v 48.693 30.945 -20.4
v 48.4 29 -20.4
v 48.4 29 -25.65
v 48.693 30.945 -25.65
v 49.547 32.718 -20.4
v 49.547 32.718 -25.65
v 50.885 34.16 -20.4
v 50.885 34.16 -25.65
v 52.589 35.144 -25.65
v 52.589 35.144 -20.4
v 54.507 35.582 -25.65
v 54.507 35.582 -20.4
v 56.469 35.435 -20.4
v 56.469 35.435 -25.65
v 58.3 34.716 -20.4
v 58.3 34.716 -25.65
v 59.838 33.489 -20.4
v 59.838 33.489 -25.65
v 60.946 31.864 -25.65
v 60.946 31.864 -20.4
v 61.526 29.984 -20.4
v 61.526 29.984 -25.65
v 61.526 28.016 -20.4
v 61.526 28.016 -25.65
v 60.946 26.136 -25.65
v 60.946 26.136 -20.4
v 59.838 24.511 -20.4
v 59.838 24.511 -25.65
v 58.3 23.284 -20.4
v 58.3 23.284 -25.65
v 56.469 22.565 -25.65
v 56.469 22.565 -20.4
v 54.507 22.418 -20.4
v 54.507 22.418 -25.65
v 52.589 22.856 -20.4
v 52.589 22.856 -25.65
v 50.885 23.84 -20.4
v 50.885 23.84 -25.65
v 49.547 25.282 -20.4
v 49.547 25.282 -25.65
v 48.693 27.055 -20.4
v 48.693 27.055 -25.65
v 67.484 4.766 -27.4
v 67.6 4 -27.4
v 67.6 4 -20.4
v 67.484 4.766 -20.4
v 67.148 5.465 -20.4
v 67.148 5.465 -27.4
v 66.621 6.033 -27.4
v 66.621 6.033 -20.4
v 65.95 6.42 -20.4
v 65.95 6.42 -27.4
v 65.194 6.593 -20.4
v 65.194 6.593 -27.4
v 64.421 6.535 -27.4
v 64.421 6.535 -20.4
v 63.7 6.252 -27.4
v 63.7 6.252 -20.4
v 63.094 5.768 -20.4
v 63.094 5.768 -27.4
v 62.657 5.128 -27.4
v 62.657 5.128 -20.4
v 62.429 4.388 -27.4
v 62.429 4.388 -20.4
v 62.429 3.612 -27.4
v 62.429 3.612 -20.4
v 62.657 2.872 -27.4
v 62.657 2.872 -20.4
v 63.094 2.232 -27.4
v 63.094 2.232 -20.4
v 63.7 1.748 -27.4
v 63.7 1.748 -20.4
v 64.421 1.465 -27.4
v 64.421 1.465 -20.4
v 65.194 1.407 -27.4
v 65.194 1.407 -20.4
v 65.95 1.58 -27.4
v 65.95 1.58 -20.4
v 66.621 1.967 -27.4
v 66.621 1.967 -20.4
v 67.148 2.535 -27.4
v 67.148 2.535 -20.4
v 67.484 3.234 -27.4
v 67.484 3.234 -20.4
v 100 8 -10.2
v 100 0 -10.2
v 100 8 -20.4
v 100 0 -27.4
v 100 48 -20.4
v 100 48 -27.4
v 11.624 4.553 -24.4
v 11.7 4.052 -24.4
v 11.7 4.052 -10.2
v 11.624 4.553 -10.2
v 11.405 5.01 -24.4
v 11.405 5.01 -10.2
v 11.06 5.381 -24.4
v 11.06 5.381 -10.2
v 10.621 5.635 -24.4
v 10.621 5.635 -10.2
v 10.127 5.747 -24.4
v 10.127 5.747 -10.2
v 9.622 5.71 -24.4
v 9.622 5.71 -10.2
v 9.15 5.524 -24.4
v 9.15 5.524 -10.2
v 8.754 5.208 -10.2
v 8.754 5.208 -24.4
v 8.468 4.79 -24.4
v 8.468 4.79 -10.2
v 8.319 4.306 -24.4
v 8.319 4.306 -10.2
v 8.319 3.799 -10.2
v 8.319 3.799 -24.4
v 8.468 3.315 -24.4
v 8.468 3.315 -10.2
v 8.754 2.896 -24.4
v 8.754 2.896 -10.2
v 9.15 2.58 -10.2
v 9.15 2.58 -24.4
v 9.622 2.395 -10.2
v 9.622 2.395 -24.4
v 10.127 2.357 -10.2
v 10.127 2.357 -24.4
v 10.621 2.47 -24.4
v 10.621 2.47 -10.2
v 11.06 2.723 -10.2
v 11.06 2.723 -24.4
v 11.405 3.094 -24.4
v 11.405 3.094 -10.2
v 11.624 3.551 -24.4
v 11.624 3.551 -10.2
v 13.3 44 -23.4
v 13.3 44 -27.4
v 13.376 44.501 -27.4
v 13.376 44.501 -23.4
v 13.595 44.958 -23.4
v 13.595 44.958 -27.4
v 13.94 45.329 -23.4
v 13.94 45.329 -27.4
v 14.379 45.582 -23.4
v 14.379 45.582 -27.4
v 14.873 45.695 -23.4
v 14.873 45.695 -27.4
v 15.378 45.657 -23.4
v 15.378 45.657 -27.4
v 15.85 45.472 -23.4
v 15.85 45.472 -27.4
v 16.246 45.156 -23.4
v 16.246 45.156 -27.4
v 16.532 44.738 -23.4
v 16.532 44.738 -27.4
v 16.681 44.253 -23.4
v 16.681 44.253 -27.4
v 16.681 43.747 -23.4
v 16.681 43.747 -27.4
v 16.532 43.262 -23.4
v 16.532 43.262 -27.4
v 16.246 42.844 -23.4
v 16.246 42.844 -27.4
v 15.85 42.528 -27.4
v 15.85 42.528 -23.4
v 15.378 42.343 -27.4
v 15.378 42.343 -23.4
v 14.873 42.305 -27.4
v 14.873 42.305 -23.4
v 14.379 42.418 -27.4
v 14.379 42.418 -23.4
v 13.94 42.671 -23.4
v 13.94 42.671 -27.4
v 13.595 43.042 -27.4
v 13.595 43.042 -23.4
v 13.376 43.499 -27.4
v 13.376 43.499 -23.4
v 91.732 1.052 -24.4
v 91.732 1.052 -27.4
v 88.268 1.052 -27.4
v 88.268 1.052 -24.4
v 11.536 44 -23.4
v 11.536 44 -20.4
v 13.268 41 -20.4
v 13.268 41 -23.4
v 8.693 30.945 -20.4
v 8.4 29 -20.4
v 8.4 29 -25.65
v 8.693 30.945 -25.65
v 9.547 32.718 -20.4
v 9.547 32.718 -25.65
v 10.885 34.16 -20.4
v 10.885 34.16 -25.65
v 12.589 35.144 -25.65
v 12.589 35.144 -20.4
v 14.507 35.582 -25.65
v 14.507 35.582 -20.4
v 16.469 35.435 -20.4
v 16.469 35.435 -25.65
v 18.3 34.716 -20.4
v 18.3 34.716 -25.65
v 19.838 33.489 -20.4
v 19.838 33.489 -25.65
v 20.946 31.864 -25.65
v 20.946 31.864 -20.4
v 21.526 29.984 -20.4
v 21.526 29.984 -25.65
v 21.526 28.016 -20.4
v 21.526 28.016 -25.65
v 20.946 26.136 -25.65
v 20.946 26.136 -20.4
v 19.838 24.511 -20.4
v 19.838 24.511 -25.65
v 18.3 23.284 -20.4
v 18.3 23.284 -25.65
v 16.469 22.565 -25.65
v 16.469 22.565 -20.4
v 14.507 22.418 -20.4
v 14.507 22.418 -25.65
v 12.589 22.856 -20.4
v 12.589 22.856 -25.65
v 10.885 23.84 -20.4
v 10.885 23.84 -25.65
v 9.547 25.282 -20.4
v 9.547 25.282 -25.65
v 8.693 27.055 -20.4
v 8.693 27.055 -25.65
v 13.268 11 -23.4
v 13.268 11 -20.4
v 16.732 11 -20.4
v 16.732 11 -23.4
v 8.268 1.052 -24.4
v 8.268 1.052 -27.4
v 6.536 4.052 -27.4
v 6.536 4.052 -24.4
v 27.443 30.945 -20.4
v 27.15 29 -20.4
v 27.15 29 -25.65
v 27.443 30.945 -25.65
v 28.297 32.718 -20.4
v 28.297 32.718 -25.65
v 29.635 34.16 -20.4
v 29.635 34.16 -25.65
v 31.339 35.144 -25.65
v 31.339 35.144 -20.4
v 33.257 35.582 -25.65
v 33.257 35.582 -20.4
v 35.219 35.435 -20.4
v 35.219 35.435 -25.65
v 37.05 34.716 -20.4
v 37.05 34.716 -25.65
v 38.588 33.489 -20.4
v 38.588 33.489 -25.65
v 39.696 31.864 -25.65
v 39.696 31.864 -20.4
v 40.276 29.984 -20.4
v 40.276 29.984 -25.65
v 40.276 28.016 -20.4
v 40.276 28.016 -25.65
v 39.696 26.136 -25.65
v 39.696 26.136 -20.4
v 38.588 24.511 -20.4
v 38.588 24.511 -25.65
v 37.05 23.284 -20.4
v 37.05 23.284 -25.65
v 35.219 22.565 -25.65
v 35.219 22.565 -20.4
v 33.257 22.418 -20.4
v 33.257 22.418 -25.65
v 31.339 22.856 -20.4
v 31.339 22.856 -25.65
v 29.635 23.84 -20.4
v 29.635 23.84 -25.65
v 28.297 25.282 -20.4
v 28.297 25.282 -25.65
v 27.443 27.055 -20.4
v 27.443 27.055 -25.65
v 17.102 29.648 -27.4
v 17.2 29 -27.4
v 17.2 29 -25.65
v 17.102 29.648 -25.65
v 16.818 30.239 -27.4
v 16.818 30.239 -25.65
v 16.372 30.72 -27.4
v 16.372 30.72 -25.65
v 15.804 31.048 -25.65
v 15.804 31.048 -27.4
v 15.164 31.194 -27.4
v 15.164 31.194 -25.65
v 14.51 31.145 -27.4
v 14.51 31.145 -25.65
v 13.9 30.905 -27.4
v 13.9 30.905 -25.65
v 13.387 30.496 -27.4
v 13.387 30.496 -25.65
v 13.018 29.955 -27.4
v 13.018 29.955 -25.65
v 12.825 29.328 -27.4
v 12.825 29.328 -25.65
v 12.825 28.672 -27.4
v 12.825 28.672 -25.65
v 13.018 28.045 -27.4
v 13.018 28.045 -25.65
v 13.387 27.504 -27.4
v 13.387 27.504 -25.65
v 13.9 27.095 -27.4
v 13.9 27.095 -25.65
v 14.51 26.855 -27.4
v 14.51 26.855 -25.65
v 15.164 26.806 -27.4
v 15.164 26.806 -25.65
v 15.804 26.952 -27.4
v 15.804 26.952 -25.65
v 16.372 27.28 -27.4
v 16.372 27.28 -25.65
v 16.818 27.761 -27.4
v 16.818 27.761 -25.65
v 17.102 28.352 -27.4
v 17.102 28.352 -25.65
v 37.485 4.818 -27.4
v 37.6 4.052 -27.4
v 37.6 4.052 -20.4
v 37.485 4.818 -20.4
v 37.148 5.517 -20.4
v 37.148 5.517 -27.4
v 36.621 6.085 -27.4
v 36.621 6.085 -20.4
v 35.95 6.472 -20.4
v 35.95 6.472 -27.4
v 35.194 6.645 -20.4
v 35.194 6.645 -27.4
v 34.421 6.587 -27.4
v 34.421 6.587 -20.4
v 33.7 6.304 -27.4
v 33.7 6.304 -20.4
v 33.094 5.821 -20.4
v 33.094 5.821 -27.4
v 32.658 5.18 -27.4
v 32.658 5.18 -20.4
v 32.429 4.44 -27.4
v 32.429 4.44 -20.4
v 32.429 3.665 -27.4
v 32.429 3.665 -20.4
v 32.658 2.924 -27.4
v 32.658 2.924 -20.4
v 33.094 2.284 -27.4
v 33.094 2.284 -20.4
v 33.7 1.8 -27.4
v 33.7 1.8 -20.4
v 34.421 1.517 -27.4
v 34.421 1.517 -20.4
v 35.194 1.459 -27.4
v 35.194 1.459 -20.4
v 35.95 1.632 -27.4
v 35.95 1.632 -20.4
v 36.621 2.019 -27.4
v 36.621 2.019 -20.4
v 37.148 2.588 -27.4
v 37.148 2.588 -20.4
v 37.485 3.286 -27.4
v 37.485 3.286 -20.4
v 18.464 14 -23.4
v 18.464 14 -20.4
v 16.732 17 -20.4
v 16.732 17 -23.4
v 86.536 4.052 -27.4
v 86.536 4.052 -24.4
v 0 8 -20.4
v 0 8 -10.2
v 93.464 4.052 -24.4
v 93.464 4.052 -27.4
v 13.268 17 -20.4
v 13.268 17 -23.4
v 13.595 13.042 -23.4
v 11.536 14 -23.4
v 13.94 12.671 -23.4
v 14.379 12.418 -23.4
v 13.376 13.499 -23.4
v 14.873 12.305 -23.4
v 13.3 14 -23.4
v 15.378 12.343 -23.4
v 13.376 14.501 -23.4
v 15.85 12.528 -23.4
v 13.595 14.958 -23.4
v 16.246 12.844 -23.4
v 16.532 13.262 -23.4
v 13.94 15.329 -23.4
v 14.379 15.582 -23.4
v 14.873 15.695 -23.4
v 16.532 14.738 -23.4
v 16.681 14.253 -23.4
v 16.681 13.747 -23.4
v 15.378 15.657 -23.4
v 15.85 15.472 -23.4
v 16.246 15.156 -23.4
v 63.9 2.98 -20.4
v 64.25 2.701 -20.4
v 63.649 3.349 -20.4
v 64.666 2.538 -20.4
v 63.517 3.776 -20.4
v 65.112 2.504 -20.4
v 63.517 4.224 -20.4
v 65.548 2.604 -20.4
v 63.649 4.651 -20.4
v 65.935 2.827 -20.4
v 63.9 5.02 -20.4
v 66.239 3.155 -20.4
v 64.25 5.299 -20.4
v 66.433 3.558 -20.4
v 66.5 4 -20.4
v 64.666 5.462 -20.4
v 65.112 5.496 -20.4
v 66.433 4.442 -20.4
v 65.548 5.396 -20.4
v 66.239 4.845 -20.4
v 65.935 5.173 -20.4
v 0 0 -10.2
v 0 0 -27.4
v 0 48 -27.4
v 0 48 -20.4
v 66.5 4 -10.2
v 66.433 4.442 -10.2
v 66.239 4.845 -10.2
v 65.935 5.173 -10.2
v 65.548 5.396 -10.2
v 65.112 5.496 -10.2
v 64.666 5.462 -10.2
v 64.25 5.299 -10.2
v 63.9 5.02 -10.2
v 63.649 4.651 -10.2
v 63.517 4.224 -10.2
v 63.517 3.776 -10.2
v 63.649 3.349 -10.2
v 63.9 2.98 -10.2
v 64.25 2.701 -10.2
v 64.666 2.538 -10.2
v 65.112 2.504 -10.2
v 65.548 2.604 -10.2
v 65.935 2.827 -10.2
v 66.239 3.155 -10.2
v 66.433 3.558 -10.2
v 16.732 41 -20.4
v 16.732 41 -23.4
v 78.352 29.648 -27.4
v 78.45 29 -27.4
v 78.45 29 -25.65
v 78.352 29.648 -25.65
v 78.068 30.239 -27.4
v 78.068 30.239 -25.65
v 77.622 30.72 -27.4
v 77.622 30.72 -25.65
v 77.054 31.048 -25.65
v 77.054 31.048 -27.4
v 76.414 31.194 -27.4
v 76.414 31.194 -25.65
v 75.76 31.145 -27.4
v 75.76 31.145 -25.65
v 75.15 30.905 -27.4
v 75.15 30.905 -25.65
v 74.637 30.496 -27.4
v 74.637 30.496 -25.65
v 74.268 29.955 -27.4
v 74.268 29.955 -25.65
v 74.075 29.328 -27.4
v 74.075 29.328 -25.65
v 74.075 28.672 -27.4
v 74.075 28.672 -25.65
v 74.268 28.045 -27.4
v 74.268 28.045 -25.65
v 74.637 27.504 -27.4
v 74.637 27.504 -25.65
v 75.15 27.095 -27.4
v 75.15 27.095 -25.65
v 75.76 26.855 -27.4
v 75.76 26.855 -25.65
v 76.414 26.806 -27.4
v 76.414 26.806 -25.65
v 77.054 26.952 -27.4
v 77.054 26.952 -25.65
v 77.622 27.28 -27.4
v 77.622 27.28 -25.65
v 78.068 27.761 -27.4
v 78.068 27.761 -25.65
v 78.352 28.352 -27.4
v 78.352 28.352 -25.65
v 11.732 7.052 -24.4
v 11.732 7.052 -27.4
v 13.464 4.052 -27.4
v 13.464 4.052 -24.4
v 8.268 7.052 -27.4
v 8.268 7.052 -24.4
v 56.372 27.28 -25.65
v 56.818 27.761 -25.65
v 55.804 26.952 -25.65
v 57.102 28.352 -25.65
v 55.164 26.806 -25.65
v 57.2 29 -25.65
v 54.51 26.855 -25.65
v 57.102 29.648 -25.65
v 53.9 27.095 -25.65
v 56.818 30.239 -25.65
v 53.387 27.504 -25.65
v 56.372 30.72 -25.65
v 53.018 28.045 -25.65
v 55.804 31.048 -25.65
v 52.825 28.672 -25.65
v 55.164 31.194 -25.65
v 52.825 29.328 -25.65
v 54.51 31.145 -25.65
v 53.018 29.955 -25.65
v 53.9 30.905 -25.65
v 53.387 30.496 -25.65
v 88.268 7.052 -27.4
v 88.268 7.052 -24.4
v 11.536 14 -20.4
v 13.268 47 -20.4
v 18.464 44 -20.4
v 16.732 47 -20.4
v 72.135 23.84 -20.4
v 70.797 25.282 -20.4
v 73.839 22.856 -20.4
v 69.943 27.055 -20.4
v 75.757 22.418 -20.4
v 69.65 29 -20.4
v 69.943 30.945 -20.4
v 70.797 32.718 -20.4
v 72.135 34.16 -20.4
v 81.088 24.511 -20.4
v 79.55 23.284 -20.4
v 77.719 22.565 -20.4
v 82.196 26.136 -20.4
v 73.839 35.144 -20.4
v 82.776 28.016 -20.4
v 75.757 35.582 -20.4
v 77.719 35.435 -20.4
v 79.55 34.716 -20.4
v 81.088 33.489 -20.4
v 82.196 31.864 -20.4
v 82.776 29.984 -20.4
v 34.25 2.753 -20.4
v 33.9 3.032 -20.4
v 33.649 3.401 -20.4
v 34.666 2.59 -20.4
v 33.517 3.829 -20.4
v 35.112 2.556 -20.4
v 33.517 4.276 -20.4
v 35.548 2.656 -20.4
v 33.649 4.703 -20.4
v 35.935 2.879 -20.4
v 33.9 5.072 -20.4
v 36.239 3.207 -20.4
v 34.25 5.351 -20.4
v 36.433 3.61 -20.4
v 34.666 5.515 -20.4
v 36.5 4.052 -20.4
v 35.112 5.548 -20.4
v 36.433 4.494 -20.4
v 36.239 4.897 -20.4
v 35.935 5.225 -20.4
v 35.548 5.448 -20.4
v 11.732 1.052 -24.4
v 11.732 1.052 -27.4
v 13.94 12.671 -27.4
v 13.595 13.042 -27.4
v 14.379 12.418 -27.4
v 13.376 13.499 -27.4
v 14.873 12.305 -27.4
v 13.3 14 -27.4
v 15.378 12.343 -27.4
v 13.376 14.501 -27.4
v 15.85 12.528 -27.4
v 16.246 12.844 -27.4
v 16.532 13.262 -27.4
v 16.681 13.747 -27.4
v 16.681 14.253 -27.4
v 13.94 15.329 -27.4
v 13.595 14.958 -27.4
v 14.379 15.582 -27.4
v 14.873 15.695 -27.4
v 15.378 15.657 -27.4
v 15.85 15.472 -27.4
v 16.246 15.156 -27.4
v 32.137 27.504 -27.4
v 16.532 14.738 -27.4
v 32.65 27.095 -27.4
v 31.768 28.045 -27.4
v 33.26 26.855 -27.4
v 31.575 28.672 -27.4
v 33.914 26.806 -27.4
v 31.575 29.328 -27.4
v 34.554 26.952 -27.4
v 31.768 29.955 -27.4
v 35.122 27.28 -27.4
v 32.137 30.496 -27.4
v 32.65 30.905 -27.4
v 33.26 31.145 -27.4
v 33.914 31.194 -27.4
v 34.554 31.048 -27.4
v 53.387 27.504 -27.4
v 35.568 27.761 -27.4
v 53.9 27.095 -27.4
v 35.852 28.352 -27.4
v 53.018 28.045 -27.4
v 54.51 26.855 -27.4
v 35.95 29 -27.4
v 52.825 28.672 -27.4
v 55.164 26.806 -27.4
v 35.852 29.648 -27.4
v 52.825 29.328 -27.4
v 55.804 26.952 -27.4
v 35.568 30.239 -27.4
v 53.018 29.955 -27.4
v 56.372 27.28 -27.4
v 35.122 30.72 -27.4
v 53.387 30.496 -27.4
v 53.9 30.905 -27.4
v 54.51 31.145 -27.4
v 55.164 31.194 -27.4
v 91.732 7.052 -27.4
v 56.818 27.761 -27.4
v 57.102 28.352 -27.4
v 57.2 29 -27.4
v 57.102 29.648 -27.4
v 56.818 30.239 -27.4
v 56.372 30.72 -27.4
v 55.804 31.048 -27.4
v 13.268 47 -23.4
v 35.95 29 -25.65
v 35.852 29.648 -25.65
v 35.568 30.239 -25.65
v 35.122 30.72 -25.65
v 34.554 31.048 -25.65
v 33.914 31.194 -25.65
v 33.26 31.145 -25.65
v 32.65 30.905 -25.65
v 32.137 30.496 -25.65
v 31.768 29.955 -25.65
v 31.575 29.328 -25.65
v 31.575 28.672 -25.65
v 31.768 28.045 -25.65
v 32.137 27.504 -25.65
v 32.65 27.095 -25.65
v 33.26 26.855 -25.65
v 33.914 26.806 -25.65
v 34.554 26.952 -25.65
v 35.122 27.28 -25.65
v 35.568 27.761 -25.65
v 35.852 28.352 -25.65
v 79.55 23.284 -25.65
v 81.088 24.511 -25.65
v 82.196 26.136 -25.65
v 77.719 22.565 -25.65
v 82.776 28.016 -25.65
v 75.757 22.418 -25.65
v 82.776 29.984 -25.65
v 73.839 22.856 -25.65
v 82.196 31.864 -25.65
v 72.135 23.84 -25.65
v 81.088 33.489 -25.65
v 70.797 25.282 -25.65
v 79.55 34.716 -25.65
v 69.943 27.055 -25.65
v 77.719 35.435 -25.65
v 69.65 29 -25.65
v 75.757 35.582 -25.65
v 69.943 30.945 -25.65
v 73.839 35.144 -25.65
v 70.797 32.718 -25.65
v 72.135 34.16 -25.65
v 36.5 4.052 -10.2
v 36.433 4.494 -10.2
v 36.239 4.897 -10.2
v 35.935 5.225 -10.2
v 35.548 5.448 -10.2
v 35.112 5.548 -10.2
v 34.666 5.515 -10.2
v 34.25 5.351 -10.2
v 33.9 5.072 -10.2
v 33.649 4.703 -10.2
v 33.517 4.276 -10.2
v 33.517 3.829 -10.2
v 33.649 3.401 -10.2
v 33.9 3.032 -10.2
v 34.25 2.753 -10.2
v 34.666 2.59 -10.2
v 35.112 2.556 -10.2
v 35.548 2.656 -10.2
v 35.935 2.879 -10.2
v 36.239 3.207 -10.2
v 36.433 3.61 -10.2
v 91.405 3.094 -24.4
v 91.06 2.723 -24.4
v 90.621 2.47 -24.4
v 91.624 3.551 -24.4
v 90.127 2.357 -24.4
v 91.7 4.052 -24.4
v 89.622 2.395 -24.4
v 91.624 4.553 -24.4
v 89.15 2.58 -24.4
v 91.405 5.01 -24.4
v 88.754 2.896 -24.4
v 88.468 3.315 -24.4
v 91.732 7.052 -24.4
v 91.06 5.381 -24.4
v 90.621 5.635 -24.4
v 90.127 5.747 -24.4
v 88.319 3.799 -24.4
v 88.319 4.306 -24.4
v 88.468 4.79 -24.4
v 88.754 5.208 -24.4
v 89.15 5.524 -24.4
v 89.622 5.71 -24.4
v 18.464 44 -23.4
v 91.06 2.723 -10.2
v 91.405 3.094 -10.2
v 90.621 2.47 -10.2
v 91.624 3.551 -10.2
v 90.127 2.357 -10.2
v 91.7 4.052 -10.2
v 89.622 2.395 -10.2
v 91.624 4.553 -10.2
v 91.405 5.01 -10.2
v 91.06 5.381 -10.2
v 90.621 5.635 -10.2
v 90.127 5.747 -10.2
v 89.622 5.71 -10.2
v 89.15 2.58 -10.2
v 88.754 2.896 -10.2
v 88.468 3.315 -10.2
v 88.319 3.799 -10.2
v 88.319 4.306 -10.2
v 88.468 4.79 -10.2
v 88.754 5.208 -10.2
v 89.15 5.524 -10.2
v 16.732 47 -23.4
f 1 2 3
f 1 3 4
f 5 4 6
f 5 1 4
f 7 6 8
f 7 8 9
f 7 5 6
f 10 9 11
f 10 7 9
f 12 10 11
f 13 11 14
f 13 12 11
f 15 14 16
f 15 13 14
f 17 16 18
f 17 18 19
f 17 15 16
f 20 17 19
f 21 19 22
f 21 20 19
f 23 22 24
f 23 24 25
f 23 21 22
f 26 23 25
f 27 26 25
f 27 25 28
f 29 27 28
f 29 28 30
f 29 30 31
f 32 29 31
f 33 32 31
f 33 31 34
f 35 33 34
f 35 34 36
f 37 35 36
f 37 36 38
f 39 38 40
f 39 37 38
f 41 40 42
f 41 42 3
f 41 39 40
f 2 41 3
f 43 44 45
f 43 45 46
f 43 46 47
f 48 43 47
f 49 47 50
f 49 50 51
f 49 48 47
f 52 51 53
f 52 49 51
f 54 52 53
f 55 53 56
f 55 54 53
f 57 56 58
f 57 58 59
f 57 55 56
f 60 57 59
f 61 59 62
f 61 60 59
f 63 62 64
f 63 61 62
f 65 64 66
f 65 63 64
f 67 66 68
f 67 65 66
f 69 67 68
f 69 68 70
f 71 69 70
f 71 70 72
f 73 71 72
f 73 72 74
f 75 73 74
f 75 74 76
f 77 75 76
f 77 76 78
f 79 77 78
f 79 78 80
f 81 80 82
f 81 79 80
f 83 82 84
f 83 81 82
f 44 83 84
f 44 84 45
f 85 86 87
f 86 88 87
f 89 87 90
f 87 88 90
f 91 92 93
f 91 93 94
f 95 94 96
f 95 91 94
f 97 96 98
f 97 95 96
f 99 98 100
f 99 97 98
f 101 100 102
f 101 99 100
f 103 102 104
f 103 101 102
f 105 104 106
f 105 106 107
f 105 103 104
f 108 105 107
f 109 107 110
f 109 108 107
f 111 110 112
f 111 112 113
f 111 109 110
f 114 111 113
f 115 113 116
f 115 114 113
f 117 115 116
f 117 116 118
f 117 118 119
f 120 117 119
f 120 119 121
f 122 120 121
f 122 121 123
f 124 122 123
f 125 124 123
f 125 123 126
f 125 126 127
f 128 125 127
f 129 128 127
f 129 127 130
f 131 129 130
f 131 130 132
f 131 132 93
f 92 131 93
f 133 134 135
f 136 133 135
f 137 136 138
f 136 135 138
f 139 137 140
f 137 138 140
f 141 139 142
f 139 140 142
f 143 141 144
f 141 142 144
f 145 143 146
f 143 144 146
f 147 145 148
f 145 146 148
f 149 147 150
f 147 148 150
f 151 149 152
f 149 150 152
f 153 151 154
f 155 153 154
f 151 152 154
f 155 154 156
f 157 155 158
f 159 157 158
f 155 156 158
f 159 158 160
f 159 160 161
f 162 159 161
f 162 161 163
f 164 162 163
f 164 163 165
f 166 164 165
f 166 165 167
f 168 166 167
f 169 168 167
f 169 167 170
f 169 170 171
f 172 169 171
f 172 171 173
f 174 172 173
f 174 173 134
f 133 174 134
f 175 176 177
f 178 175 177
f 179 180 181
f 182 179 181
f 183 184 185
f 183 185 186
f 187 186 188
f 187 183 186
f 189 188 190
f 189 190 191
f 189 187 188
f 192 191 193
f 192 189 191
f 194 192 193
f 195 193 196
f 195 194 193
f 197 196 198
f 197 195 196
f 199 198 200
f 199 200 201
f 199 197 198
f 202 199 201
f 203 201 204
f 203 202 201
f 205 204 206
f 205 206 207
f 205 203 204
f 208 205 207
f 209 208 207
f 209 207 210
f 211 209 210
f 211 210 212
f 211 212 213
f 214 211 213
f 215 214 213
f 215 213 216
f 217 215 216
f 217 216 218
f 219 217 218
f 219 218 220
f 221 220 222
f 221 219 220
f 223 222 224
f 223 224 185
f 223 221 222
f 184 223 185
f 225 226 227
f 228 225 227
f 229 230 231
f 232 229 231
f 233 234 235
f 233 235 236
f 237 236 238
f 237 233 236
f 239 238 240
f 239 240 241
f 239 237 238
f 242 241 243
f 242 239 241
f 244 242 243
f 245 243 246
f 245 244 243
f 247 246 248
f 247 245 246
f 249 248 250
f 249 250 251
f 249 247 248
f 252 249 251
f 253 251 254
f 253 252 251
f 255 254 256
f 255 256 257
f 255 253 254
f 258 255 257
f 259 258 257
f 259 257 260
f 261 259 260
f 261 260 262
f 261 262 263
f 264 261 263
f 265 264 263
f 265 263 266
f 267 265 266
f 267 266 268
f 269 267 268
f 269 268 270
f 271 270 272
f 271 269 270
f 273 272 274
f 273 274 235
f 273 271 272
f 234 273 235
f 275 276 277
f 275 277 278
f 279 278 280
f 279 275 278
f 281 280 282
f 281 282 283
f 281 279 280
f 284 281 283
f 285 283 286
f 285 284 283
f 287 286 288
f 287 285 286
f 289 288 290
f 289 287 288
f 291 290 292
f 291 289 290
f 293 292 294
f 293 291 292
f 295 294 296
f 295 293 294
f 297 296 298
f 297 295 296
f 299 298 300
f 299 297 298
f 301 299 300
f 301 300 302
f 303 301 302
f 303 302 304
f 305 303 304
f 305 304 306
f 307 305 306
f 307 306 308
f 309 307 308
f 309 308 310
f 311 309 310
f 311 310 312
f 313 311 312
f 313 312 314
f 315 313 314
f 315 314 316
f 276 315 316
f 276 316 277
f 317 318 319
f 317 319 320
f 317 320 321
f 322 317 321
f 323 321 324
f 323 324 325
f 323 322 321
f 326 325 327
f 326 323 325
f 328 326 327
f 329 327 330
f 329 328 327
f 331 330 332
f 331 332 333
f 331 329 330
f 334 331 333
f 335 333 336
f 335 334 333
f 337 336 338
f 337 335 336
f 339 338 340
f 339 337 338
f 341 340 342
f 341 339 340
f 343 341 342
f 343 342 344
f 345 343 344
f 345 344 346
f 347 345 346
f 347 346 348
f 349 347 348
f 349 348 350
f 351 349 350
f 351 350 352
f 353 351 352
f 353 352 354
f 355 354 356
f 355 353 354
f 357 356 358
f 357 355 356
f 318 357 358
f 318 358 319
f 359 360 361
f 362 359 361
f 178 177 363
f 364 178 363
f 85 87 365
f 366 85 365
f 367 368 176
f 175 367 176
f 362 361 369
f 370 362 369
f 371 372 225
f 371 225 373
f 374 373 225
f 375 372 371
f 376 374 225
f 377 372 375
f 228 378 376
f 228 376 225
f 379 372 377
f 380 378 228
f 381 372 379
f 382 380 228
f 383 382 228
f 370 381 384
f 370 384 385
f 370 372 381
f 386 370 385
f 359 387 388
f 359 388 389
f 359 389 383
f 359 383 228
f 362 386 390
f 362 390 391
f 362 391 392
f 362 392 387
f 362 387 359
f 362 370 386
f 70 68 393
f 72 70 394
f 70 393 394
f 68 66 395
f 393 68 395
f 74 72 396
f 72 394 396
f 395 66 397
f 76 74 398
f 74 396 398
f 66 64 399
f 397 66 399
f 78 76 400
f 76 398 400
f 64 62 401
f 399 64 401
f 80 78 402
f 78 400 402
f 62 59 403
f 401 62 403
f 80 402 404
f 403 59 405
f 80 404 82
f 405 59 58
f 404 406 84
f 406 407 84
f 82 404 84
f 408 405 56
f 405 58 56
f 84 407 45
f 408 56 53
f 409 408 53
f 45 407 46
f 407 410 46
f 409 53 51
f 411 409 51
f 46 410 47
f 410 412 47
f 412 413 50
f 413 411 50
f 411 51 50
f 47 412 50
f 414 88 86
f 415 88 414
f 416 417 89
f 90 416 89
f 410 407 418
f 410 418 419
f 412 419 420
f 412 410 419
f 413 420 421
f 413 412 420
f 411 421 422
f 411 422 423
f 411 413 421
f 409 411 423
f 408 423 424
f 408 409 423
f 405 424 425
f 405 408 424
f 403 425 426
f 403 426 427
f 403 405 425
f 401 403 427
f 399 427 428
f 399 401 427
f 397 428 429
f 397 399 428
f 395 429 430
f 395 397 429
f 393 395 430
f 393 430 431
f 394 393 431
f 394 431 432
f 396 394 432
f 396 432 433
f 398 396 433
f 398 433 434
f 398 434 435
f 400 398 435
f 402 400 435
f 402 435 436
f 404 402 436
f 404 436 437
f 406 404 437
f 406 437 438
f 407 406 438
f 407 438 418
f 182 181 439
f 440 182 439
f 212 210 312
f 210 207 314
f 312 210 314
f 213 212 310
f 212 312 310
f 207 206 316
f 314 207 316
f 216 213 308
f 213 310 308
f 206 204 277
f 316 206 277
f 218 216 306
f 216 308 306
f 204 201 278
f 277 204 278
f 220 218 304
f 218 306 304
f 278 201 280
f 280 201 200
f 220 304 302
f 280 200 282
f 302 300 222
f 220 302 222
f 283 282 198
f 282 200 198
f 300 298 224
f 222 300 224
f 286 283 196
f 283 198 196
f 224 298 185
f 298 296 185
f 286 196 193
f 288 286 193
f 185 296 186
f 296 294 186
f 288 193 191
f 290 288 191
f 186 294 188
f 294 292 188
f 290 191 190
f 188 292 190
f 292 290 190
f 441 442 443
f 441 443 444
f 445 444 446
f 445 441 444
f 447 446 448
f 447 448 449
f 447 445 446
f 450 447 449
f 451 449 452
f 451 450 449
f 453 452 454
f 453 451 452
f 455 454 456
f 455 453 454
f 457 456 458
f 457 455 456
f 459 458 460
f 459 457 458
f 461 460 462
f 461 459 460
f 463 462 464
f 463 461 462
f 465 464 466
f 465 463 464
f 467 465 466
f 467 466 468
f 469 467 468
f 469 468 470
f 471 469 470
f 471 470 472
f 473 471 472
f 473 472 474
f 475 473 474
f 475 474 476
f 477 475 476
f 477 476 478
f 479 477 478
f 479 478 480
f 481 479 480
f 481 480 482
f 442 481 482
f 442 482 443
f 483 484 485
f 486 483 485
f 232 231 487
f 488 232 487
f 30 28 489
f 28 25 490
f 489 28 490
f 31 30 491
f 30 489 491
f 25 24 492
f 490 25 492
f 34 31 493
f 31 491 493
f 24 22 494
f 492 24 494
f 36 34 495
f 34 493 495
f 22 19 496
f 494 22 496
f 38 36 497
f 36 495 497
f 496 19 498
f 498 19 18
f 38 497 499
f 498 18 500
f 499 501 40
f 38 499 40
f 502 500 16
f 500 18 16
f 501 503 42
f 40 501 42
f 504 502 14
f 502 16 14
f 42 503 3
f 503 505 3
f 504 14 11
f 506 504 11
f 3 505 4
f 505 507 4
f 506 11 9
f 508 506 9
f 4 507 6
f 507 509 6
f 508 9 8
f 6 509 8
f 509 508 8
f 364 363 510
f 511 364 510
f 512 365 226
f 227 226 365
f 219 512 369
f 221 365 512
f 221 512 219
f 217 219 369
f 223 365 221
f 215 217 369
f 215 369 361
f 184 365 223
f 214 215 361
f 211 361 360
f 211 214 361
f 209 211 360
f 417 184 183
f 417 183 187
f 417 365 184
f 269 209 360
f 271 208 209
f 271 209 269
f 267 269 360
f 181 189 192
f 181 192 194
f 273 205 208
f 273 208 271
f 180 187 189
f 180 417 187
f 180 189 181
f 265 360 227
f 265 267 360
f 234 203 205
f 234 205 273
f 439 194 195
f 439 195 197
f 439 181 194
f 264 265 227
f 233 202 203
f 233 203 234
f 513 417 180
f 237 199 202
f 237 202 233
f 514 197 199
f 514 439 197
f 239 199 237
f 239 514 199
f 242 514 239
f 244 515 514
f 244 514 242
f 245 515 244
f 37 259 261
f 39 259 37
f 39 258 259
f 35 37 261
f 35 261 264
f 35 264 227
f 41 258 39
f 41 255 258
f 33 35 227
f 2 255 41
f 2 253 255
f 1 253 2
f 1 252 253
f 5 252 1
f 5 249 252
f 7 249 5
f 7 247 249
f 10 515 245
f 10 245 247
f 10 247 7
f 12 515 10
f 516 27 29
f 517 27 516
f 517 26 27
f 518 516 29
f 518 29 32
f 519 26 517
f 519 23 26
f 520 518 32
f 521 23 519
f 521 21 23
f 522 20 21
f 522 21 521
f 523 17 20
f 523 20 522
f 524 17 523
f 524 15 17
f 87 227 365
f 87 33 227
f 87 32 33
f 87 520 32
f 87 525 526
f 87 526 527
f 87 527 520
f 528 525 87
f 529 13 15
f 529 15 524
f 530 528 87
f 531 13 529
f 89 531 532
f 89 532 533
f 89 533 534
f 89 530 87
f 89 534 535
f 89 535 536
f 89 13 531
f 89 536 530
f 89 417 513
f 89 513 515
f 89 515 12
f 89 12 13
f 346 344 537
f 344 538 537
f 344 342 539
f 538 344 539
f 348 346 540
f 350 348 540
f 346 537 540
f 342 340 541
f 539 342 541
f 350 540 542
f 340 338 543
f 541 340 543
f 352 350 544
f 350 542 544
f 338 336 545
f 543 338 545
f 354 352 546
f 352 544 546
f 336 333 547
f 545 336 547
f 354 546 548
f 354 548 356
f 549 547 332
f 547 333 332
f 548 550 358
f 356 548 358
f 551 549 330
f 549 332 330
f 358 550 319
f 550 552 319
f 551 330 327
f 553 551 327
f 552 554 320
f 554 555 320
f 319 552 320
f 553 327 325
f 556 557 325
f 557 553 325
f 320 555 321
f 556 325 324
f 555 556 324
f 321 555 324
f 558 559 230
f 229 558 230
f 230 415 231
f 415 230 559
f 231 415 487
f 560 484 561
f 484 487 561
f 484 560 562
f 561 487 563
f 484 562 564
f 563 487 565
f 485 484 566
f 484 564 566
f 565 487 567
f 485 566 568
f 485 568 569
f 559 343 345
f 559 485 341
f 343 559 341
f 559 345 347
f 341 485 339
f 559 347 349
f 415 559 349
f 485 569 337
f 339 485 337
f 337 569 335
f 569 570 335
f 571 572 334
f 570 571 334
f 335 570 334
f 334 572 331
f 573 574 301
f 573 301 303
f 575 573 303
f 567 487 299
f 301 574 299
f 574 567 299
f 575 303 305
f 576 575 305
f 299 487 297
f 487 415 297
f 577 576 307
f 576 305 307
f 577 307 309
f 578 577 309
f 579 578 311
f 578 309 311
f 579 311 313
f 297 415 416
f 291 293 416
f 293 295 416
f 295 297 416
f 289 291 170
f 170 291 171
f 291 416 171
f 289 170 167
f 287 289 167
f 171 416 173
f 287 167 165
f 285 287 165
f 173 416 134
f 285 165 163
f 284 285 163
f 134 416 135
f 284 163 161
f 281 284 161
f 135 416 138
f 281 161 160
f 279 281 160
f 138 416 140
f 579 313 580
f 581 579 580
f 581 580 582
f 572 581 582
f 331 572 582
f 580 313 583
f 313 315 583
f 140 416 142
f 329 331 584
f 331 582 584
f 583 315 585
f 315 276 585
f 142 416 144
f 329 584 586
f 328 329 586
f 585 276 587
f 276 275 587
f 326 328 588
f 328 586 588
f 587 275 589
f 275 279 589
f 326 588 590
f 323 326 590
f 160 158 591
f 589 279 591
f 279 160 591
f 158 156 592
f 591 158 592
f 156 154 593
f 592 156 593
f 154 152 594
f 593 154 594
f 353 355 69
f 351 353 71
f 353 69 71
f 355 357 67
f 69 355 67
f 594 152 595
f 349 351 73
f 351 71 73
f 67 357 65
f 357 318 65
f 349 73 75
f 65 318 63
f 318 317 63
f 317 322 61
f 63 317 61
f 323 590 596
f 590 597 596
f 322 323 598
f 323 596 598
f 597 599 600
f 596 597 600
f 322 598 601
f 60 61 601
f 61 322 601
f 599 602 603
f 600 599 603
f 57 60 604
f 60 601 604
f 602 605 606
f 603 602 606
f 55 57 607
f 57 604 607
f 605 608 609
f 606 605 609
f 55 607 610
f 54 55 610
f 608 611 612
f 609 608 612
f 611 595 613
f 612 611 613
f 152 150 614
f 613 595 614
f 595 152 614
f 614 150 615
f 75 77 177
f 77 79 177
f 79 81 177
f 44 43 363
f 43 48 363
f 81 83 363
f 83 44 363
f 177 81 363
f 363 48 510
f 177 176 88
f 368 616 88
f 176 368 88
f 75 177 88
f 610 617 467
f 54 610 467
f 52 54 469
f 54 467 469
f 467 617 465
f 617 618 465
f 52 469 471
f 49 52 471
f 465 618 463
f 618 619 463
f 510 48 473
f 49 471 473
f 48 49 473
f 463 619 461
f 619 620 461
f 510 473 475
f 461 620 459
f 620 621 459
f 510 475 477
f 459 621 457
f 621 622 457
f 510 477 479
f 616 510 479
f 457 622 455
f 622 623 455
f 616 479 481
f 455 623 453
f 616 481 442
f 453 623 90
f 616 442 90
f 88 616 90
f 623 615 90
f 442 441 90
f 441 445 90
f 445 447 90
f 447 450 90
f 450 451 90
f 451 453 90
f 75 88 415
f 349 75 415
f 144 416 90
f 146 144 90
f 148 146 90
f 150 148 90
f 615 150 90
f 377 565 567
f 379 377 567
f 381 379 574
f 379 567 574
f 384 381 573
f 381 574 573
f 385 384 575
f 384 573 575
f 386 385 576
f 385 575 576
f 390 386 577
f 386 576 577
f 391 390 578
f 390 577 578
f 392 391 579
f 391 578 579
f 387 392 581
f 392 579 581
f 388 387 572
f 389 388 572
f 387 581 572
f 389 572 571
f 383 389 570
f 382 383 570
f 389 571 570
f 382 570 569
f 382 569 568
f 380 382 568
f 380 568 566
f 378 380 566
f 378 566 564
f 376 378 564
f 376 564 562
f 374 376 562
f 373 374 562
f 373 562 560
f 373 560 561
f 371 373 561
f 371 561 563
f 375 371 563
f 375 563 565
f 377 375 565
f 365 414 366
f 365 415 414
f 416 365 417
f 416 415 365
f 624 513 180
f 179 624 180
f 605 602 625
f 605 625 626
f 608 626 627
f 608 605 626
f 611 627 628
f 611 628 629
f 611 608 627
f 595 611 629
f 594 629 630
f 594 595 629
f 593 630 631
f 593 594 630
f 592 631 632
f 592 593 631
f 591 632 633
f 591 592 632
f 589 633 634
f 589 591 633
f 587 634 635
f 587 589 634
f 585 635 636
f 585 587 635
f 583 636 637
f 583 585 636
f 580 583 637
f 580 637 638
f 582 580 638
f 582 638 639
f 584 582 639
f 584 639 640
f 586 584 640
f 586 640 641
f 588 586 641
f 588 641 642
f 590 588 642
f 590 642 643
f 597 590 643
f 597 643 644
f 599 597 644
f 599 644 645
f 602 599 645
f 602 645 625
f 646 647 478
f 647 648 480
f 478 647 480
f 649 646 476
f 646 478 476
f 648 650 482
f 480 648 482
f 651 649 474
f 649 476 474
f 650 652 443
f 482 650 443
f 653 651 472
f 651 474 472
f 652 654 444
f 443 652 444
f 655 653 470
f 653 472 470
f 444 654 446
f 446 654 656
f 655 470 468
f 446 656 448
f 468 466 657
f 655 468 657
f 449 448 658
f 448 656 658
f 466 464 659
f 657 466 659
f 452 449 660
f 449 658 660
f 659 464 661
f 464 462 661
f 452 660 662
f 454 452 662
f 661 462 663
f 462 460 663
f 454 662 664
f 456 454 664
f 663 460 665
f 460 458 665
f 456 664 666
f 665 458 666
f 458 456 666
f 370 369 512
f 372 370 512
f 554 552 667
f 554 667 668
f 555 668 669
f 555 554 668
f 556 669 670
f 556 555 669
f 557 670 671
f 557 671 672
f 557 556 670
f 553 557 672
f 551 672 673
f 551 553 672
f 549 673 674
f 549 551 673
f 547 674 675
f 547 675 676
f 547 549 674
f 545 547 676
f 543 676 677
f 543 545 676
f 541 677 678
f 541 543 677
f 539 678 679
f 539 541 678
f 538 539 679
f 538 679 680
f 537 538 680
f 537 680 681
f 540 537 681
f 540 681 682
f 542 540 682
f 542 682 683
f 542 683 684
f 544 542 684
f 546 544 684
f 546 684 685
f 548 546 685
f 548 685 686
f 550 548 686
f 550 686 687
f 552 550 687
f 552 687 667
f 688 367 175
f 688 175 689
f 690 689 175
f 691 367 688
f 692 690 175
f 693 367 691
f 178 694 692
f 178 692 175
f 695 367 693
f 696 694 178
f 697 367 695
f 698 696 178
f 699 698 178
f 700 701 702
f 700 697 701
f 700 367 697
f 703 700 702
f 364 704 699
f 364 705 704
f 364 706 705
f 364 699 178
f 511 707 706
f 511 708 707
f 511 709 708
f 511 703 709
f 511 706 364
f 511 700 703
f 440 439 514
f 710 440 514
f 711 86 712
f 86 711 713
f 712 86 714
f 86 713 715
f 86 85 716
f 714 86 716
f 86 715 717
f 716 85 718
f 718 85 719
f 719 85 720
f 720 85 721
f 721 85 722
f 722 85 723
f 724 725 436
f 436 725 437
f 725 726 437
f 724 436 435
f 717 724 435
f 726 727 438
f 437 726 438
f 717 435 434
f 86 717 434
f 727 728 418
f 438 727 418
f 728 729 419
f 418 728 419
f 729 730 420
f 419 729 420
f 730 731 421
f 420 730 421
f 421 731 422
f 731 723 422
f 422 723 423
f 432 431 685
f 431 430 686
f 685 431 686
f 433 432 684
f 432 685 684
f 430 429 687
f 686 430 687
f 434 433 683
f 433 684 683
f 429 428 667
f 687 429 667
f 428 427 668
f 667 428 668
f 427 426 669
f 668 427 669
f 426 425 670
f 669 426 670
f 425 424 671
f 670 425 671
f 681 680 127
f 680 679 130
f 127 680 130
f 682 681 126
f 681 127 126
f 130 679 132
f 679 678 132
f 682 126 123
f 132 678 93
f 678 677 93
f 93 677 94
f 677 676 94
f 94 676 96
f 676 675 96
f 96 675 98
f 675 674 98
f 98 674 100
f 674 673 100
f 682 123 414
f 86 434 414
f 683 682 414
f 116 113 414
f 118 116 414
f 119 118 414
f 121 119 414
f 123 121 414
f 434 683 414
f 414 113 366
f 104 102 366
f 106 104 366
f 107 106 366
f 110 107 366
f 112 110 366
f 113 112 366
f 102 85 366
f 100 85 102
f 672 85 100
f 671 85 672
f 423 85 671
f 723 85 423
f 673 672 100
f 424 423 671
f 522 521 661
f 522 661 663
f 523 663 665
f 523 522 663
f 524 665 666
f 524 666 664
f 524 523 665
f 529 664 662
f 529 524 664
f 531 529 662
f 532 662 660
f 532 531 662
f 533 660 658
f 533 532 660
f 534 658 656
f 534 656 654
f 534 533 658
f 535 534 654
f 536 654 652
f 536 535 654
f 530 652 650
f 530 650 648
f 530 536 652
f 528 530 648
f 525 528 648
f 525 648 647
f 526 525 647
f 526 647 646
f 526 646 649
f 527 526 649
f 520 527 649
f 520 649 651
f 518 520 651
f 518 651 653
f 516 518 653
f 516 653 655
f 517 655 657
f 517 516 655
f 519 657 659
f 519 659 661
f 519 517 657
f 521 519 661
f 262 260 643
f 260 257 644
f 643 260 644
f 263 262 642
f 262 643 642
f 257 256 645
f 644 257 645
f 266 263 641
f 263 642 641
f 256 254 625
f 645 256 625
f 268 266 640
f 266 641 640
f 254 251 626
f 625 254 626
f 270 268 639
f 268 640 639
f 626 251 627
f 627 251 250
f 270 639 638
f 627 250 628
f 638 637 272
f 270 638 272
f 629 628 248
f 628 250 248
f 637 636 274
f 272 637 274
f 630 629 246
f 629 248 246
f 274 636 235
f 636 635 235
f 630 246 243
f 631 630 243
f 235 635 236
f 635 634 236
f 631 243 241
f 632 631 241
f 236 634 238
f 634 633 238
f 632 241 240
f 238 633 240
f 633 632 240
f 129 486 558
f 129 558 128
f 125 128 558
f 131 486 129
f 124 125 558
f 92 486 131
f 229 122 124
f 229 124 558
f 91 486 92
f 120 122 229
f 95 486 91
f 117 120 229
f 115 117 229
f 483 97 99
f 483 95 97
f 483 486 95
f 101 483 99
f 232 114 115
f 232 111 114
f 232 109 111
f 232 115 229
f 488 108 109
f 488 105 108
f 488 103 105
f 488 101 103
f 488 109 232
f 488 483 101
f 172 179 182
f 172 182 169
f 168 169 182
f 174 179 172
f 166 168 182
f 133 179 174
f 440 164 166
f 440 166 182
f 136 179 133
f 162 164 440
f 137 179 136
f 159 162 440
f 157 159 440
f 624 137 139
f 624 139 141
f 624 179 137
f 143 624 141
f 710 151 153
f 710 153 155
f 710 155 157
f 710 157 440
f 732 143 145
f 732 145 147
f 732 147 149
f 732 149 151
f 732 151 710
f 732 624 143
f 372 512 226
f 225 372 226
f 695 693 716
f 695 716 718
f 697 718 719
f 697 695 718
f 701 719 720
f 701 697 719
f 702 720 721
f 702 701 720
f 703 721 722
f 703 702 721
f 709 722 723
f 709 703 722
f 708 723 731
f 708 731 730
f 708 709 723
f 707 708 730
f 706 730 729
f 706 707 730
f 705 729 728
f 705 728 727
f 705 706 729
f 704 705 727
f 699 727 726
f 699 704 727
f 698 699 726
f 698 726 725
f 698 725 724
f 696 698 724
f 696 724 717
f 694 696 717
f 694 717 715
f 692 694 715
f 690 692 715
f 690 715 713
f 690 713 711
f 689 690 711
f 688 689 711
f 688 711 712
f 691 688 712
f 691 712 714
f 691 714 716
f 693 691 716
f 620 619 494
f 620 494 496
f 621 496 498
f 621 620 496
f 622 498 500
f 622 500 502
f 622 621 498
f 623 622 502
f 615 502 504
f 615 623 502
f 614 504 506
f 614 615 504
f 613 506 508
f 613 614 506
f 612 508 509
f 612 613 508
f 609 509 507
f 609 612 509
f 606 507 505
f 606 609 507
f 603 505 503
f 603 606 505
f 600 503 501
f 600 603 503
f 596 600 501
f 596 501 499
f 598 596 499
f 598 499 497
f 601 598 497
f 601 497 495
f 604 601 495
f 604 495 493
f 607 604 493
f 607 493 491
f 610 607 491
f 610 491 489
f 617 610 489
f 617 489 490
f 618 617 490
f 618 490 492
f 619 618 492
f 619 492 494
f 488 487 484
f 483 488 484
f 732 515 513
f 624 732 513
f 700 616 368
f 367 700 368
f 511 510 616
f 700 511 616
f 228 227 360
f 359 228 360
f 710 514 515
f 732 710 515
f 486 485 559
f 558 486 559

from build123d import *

# Parameters (mm, degrees)
SKETCH1_W           = 100
SKETCH1_H           = 48
BOSS_EXTRUDE1_DEPTH = 7
CUT_EXTRUDE1_REACH  = 113.144
SKETCH2_R           = 2.2
SKETCH3_W           = 100
SKETCH3_H           = 8
BOSS_EXTRUDE2_DEPTH = 10.2
SKETCH4_R           = 6.6
CUT_EXTRUDE2_DEPTH  = 5.25
SKETCH5_R           = 2.6
CUT_EXTRUDE3_DEPTH  = 7
SKETCH7_R           = 1.5
CUT_EXTRUDE4_DEPTH  = 112.391382072
CUT_EXTRUDE5_REACH  = 114.249
SKETCH8_R           = 1.7
CUT_EXTRUDE6_DEPTH  = 3
CUT_EXTRUDE7_REACH  = 114.249
SKETCH10_R          = 1.7
CUT_EXTRUDE8_DEPTH  = 3


with BuildPart() as part:
    # Sketch1 → Boss-Extrude1 (new body)
    with BuildSketch(Plane.XY):
        with Locations((50, 24)):
            Rectangle(SKETCH1_W, SKETCH1_H)
    extrude(amount=BOSS_EXTRUDE1_DEPTH)

    # Sketch2 → Cut-Extrude1 (cut, up to next)
    with BuildSketch(Plane.XY.offset(7), mode=Mode.PRIVATE) as cut_extrude1_sk1:
        with Locations((15, 29)):
            Circle(SKETCH2_R)
    cut_extrude1_tool1 = extrude(cut_extrude1_sk1.sketch, amount=-CUT_EXTRUDE1_REACH, mode=Mode.PRIVATE) & part.part
    # Sketch2 → Cut-Extrude1 (cut, up to next)
    with BuildSketch(Plane.XY.offset(7), mode=Mode.PRIVATE) as cut_extrude1_sk2:
        with Locations((33.75, 29)):
            Circle(SKETCH2_R)
    cut_extrude1_tool2 = extrude(cut_extrude1_sk2.sketch, amount=-CUT_EXTRUDE1_REACH, mode=Mode.PRIVATE) & part.part
    # Sketch2 → Cut-Extrude1 (cut, up to next)
    with BuildSketch(Plane.XY.offset(7), mode=Mode.PRIVATE) as cut_extrude1_sk3:
        with Locations((55, 29)):
            Circle(SKETCH2_R)
    cut_extrude1_tool3 = extrude(cut_extrude1_sk3.sketch, amount=-CUT_EXTRUDE1_REACH, mode=Mode.PRIVATE) & part.part
    # Sketch2 → Cut-Extrude1 (cut, up to next)
    with BuildSketch(Plane.XY.offset(7), mode=Mode.PRIVATE) as cut_extrude1_sk4:
        with Locations((76.25, 29)):
            Circle(SKETCH2_R)
    cut_extrude1_tool4 = extrude(cut_extrude1_sk4.sketch, amount=-CUT_EXTRUDE1_REACH, mode=Mode.PRIVATE) & part.part
    add(cut_extrude1_tool1.solids().sort_by_distance((15, 29, 7))[0], mode=Mode.SUBTRACT)
    add(cut_extrude1_tool2.solids().sort_by_distance((33.75, 29, 7))[0], mode=Mode.SUBTRACT)
    add(cut_extrude1_tool3.solids().sort_by_distance((55, 29, 7))[0], mode=Mode.SUBTRACT)
    add(cut_extrude1_tool4.solids().sort_by_distance((76.25, 29, 7))[0], mode=Mode.SUBTRACT)

    # Sketch3 → Boss-Extrude2 (add)
    with BuildSketch(Plane(origin=(0, 0, 0), x_dir=(-1, 0, 0), z_dir=(0, 0, -1))):
        with Locations((-50, 4)):
            Rectangle(SKETCH3_W, SKETCH3_H)
    extrude(amount=BOSS_EXTRUDE2_DEPTH)

    # Sketch4 → Cut-Extrude2 (cut)
    with BuildSketch(Plane(origin=(0, 0, 0), x_dir=(-1, 0, 0), z_dir=(0, 0, -1))):
        with Locations((-76.25, 29)):
            Circle(SKETCH4_R)
        with Locations((-55, 29)):
            Circle(SKETCH4_R)
        with Locations((-33.75, 29)):
            Circle(SKETCH4_R)
        with Locations((-15, 29)):
            Circle(SKETCH4_R)
    extrude(amount=-CUT_EXTRUDE2_DEPTH, mode=Mode.SUBTRACT)

    # Sketch5 → Cut-Extrude3 (cut)
    with BuildSketch(Plane.XY.offset(7)):
        with Locations((35.000022648, 4.052132501)):
            Circle(SKETCH5_R)
        with Locations((64.999977352, 4)):
            Circle(SKETCH5_R)
    extrude(amount=-CUT_EXTRUDE3_DEPTH, mode=Mode.SUBTRACT)

    # Sketch7 → Cut-Extrude4 (cut, through all)
    with BuildSketch(Plane.XY):
        with Locations((35.000022648, 4.052132501)):
            Circle(SKETCH7_R)
        with Locations((64.999977352, 4)):
            Circle(SKETCH7_R)
    extrude(amount=-CUT_EXTRUDE4_DEPTH, mode=Mode.SUBTRACT)

    # Sketch8 → Cut-Extrude5 (cut, up to next)
    with BuildSketch(Plane.XY.offset(7), mode=Mode.PRIVATE) as cut_extrude5_sk1:
        with Locations((10, 4.052132501)):
            Circle(SKETCH8_R)
    cut_extrude5_tool1 = extrude(cut_extrude5_sk1.sketch, amount=-CUT_EXTRUDE5_REACH, mode=Mode.PRIVATE) & part.part
    # Sketch8 → Cut-Extrude5 (cut, up to next)
    with BuildSketch(Plane.XY.offset(7), mode=Mode.PRIVATE) as cut_extrude5_sk2:
        with Locations((90, 4.052132501)):
            Circle(SKETCH8_R)
    cut_extrude5_tool2 = extrude(cut_extrude5_sk2.sketch, amount=-CUT_EXTRUDE5_REACH, mode=Mode.PRIVATE) & part.part
    add(cut_extrude5_tool1.solids().sort_by_distance((10, 4.052133, 7))[0], mode=Mode.SUBTRACT)
    add(cut_extrude5_tool2.solids().sort_by_distance((90, 4.052133, 7))[0], mode=Mode.SUBTRACT)


with BuildPart() as body_2:
    # Mirror1: mirrored copy
    add(part.part.mirror(Plane.XY.offset(-10.2)))

    # Sketch9 → Cut-Extrude6 (cut)
    with BuildSketch(Plane(origin=(0, 0, -27.4), x_dir=(-1, 0, 0), z_dir=(0, 0, -1))):
        Polygon((-88.267949192, 1.052132501), (-86.535898385, 4.052132501), (-88.267949192, 7.052132501), (-91.732050808, 7.052132501), (-93.464101615, 4.052132501), (-91.732050808, 1.052132501), align=None)
        Polygon((-13.464101615, 4.052132501), (-11.732050808, 1.052132501), (-8.267949192, 1.052132501), (-6.535898385, 4.052132501), (-8.267949192, 7.052132501), (-11.732050808, 7.052132501), align=None)
    extrude(amount=-CUT_EXTRUDE6_DEPTH, mode=Mode.SUBTRACT)

    # Sketch10 → Cut-Extrude7 (cut, up to next)
    with BuildSketch(Plane(origin=(0, 0, -27.4), x_dir=(-1, 0, 0), z_dir=(0, 0, -1)), mode=Mode.PRIVATE) as cut_extrude7_sk1:
        with Locations((-15, 44)):
            Circle(SKETCH10_R)
    cut_extrude7_tool1 = extrude(cut_extrude7_sk1.sketch, amount=-CUT_EXTRUDE7_REACH, mode=Mode.PRIVATE) & body_2.part
    # Sketch10 → Cut-Extrude7 (cut, up to next)
    with BuildSketch(Plane(origin=(0, 0, -27.4), x_dir=(-1, 0, 0), z_dir=(0, 0, -1)), mode=Mode.PRIVATE) as cut_extrude7_sk2:
        with Locations((-15, 14)):
            Circle(SKETCH10_R)
    cut_extrude7_tool2 = extrude(cut_extrude7_sk2.sketch, amount=-CUT_EXTRUDE7_REACH, mode=Mode.PRIVATE) & body_2.part
    add(cut_extrude7_tool1.solids().sort_by_distance((15, 44, -27.4))[0], mode=Mode.SUBTRACT)
    add(cut_extrude7_tool2.solids().sort_by_distance((15, 14, -27.4))[0], mode=Mode.SUBTRACT)

    # Sketch11 → Cut-Extrude8 (cut)
    with BuildSketch(Plane.XY.offset(-20.4)):
        Polygon((18.464101615, 44), (16.732050808, 47), (13.267949192, 47), (11.535898385, 44), (13.267949192, 41), (16.732050808, 41), align=None)
        Polygon((18.464101615, 14), (16.732050808, 17), (13.267949192, 17), (11.535898385, 14), (13.267949192, 11), (16.732050808, 11), align=None)
    extrude(amount=-CUT_EXTRUDE8_DEPTH, mode=Mode.SUBTRACT)


solid = body_2.part
